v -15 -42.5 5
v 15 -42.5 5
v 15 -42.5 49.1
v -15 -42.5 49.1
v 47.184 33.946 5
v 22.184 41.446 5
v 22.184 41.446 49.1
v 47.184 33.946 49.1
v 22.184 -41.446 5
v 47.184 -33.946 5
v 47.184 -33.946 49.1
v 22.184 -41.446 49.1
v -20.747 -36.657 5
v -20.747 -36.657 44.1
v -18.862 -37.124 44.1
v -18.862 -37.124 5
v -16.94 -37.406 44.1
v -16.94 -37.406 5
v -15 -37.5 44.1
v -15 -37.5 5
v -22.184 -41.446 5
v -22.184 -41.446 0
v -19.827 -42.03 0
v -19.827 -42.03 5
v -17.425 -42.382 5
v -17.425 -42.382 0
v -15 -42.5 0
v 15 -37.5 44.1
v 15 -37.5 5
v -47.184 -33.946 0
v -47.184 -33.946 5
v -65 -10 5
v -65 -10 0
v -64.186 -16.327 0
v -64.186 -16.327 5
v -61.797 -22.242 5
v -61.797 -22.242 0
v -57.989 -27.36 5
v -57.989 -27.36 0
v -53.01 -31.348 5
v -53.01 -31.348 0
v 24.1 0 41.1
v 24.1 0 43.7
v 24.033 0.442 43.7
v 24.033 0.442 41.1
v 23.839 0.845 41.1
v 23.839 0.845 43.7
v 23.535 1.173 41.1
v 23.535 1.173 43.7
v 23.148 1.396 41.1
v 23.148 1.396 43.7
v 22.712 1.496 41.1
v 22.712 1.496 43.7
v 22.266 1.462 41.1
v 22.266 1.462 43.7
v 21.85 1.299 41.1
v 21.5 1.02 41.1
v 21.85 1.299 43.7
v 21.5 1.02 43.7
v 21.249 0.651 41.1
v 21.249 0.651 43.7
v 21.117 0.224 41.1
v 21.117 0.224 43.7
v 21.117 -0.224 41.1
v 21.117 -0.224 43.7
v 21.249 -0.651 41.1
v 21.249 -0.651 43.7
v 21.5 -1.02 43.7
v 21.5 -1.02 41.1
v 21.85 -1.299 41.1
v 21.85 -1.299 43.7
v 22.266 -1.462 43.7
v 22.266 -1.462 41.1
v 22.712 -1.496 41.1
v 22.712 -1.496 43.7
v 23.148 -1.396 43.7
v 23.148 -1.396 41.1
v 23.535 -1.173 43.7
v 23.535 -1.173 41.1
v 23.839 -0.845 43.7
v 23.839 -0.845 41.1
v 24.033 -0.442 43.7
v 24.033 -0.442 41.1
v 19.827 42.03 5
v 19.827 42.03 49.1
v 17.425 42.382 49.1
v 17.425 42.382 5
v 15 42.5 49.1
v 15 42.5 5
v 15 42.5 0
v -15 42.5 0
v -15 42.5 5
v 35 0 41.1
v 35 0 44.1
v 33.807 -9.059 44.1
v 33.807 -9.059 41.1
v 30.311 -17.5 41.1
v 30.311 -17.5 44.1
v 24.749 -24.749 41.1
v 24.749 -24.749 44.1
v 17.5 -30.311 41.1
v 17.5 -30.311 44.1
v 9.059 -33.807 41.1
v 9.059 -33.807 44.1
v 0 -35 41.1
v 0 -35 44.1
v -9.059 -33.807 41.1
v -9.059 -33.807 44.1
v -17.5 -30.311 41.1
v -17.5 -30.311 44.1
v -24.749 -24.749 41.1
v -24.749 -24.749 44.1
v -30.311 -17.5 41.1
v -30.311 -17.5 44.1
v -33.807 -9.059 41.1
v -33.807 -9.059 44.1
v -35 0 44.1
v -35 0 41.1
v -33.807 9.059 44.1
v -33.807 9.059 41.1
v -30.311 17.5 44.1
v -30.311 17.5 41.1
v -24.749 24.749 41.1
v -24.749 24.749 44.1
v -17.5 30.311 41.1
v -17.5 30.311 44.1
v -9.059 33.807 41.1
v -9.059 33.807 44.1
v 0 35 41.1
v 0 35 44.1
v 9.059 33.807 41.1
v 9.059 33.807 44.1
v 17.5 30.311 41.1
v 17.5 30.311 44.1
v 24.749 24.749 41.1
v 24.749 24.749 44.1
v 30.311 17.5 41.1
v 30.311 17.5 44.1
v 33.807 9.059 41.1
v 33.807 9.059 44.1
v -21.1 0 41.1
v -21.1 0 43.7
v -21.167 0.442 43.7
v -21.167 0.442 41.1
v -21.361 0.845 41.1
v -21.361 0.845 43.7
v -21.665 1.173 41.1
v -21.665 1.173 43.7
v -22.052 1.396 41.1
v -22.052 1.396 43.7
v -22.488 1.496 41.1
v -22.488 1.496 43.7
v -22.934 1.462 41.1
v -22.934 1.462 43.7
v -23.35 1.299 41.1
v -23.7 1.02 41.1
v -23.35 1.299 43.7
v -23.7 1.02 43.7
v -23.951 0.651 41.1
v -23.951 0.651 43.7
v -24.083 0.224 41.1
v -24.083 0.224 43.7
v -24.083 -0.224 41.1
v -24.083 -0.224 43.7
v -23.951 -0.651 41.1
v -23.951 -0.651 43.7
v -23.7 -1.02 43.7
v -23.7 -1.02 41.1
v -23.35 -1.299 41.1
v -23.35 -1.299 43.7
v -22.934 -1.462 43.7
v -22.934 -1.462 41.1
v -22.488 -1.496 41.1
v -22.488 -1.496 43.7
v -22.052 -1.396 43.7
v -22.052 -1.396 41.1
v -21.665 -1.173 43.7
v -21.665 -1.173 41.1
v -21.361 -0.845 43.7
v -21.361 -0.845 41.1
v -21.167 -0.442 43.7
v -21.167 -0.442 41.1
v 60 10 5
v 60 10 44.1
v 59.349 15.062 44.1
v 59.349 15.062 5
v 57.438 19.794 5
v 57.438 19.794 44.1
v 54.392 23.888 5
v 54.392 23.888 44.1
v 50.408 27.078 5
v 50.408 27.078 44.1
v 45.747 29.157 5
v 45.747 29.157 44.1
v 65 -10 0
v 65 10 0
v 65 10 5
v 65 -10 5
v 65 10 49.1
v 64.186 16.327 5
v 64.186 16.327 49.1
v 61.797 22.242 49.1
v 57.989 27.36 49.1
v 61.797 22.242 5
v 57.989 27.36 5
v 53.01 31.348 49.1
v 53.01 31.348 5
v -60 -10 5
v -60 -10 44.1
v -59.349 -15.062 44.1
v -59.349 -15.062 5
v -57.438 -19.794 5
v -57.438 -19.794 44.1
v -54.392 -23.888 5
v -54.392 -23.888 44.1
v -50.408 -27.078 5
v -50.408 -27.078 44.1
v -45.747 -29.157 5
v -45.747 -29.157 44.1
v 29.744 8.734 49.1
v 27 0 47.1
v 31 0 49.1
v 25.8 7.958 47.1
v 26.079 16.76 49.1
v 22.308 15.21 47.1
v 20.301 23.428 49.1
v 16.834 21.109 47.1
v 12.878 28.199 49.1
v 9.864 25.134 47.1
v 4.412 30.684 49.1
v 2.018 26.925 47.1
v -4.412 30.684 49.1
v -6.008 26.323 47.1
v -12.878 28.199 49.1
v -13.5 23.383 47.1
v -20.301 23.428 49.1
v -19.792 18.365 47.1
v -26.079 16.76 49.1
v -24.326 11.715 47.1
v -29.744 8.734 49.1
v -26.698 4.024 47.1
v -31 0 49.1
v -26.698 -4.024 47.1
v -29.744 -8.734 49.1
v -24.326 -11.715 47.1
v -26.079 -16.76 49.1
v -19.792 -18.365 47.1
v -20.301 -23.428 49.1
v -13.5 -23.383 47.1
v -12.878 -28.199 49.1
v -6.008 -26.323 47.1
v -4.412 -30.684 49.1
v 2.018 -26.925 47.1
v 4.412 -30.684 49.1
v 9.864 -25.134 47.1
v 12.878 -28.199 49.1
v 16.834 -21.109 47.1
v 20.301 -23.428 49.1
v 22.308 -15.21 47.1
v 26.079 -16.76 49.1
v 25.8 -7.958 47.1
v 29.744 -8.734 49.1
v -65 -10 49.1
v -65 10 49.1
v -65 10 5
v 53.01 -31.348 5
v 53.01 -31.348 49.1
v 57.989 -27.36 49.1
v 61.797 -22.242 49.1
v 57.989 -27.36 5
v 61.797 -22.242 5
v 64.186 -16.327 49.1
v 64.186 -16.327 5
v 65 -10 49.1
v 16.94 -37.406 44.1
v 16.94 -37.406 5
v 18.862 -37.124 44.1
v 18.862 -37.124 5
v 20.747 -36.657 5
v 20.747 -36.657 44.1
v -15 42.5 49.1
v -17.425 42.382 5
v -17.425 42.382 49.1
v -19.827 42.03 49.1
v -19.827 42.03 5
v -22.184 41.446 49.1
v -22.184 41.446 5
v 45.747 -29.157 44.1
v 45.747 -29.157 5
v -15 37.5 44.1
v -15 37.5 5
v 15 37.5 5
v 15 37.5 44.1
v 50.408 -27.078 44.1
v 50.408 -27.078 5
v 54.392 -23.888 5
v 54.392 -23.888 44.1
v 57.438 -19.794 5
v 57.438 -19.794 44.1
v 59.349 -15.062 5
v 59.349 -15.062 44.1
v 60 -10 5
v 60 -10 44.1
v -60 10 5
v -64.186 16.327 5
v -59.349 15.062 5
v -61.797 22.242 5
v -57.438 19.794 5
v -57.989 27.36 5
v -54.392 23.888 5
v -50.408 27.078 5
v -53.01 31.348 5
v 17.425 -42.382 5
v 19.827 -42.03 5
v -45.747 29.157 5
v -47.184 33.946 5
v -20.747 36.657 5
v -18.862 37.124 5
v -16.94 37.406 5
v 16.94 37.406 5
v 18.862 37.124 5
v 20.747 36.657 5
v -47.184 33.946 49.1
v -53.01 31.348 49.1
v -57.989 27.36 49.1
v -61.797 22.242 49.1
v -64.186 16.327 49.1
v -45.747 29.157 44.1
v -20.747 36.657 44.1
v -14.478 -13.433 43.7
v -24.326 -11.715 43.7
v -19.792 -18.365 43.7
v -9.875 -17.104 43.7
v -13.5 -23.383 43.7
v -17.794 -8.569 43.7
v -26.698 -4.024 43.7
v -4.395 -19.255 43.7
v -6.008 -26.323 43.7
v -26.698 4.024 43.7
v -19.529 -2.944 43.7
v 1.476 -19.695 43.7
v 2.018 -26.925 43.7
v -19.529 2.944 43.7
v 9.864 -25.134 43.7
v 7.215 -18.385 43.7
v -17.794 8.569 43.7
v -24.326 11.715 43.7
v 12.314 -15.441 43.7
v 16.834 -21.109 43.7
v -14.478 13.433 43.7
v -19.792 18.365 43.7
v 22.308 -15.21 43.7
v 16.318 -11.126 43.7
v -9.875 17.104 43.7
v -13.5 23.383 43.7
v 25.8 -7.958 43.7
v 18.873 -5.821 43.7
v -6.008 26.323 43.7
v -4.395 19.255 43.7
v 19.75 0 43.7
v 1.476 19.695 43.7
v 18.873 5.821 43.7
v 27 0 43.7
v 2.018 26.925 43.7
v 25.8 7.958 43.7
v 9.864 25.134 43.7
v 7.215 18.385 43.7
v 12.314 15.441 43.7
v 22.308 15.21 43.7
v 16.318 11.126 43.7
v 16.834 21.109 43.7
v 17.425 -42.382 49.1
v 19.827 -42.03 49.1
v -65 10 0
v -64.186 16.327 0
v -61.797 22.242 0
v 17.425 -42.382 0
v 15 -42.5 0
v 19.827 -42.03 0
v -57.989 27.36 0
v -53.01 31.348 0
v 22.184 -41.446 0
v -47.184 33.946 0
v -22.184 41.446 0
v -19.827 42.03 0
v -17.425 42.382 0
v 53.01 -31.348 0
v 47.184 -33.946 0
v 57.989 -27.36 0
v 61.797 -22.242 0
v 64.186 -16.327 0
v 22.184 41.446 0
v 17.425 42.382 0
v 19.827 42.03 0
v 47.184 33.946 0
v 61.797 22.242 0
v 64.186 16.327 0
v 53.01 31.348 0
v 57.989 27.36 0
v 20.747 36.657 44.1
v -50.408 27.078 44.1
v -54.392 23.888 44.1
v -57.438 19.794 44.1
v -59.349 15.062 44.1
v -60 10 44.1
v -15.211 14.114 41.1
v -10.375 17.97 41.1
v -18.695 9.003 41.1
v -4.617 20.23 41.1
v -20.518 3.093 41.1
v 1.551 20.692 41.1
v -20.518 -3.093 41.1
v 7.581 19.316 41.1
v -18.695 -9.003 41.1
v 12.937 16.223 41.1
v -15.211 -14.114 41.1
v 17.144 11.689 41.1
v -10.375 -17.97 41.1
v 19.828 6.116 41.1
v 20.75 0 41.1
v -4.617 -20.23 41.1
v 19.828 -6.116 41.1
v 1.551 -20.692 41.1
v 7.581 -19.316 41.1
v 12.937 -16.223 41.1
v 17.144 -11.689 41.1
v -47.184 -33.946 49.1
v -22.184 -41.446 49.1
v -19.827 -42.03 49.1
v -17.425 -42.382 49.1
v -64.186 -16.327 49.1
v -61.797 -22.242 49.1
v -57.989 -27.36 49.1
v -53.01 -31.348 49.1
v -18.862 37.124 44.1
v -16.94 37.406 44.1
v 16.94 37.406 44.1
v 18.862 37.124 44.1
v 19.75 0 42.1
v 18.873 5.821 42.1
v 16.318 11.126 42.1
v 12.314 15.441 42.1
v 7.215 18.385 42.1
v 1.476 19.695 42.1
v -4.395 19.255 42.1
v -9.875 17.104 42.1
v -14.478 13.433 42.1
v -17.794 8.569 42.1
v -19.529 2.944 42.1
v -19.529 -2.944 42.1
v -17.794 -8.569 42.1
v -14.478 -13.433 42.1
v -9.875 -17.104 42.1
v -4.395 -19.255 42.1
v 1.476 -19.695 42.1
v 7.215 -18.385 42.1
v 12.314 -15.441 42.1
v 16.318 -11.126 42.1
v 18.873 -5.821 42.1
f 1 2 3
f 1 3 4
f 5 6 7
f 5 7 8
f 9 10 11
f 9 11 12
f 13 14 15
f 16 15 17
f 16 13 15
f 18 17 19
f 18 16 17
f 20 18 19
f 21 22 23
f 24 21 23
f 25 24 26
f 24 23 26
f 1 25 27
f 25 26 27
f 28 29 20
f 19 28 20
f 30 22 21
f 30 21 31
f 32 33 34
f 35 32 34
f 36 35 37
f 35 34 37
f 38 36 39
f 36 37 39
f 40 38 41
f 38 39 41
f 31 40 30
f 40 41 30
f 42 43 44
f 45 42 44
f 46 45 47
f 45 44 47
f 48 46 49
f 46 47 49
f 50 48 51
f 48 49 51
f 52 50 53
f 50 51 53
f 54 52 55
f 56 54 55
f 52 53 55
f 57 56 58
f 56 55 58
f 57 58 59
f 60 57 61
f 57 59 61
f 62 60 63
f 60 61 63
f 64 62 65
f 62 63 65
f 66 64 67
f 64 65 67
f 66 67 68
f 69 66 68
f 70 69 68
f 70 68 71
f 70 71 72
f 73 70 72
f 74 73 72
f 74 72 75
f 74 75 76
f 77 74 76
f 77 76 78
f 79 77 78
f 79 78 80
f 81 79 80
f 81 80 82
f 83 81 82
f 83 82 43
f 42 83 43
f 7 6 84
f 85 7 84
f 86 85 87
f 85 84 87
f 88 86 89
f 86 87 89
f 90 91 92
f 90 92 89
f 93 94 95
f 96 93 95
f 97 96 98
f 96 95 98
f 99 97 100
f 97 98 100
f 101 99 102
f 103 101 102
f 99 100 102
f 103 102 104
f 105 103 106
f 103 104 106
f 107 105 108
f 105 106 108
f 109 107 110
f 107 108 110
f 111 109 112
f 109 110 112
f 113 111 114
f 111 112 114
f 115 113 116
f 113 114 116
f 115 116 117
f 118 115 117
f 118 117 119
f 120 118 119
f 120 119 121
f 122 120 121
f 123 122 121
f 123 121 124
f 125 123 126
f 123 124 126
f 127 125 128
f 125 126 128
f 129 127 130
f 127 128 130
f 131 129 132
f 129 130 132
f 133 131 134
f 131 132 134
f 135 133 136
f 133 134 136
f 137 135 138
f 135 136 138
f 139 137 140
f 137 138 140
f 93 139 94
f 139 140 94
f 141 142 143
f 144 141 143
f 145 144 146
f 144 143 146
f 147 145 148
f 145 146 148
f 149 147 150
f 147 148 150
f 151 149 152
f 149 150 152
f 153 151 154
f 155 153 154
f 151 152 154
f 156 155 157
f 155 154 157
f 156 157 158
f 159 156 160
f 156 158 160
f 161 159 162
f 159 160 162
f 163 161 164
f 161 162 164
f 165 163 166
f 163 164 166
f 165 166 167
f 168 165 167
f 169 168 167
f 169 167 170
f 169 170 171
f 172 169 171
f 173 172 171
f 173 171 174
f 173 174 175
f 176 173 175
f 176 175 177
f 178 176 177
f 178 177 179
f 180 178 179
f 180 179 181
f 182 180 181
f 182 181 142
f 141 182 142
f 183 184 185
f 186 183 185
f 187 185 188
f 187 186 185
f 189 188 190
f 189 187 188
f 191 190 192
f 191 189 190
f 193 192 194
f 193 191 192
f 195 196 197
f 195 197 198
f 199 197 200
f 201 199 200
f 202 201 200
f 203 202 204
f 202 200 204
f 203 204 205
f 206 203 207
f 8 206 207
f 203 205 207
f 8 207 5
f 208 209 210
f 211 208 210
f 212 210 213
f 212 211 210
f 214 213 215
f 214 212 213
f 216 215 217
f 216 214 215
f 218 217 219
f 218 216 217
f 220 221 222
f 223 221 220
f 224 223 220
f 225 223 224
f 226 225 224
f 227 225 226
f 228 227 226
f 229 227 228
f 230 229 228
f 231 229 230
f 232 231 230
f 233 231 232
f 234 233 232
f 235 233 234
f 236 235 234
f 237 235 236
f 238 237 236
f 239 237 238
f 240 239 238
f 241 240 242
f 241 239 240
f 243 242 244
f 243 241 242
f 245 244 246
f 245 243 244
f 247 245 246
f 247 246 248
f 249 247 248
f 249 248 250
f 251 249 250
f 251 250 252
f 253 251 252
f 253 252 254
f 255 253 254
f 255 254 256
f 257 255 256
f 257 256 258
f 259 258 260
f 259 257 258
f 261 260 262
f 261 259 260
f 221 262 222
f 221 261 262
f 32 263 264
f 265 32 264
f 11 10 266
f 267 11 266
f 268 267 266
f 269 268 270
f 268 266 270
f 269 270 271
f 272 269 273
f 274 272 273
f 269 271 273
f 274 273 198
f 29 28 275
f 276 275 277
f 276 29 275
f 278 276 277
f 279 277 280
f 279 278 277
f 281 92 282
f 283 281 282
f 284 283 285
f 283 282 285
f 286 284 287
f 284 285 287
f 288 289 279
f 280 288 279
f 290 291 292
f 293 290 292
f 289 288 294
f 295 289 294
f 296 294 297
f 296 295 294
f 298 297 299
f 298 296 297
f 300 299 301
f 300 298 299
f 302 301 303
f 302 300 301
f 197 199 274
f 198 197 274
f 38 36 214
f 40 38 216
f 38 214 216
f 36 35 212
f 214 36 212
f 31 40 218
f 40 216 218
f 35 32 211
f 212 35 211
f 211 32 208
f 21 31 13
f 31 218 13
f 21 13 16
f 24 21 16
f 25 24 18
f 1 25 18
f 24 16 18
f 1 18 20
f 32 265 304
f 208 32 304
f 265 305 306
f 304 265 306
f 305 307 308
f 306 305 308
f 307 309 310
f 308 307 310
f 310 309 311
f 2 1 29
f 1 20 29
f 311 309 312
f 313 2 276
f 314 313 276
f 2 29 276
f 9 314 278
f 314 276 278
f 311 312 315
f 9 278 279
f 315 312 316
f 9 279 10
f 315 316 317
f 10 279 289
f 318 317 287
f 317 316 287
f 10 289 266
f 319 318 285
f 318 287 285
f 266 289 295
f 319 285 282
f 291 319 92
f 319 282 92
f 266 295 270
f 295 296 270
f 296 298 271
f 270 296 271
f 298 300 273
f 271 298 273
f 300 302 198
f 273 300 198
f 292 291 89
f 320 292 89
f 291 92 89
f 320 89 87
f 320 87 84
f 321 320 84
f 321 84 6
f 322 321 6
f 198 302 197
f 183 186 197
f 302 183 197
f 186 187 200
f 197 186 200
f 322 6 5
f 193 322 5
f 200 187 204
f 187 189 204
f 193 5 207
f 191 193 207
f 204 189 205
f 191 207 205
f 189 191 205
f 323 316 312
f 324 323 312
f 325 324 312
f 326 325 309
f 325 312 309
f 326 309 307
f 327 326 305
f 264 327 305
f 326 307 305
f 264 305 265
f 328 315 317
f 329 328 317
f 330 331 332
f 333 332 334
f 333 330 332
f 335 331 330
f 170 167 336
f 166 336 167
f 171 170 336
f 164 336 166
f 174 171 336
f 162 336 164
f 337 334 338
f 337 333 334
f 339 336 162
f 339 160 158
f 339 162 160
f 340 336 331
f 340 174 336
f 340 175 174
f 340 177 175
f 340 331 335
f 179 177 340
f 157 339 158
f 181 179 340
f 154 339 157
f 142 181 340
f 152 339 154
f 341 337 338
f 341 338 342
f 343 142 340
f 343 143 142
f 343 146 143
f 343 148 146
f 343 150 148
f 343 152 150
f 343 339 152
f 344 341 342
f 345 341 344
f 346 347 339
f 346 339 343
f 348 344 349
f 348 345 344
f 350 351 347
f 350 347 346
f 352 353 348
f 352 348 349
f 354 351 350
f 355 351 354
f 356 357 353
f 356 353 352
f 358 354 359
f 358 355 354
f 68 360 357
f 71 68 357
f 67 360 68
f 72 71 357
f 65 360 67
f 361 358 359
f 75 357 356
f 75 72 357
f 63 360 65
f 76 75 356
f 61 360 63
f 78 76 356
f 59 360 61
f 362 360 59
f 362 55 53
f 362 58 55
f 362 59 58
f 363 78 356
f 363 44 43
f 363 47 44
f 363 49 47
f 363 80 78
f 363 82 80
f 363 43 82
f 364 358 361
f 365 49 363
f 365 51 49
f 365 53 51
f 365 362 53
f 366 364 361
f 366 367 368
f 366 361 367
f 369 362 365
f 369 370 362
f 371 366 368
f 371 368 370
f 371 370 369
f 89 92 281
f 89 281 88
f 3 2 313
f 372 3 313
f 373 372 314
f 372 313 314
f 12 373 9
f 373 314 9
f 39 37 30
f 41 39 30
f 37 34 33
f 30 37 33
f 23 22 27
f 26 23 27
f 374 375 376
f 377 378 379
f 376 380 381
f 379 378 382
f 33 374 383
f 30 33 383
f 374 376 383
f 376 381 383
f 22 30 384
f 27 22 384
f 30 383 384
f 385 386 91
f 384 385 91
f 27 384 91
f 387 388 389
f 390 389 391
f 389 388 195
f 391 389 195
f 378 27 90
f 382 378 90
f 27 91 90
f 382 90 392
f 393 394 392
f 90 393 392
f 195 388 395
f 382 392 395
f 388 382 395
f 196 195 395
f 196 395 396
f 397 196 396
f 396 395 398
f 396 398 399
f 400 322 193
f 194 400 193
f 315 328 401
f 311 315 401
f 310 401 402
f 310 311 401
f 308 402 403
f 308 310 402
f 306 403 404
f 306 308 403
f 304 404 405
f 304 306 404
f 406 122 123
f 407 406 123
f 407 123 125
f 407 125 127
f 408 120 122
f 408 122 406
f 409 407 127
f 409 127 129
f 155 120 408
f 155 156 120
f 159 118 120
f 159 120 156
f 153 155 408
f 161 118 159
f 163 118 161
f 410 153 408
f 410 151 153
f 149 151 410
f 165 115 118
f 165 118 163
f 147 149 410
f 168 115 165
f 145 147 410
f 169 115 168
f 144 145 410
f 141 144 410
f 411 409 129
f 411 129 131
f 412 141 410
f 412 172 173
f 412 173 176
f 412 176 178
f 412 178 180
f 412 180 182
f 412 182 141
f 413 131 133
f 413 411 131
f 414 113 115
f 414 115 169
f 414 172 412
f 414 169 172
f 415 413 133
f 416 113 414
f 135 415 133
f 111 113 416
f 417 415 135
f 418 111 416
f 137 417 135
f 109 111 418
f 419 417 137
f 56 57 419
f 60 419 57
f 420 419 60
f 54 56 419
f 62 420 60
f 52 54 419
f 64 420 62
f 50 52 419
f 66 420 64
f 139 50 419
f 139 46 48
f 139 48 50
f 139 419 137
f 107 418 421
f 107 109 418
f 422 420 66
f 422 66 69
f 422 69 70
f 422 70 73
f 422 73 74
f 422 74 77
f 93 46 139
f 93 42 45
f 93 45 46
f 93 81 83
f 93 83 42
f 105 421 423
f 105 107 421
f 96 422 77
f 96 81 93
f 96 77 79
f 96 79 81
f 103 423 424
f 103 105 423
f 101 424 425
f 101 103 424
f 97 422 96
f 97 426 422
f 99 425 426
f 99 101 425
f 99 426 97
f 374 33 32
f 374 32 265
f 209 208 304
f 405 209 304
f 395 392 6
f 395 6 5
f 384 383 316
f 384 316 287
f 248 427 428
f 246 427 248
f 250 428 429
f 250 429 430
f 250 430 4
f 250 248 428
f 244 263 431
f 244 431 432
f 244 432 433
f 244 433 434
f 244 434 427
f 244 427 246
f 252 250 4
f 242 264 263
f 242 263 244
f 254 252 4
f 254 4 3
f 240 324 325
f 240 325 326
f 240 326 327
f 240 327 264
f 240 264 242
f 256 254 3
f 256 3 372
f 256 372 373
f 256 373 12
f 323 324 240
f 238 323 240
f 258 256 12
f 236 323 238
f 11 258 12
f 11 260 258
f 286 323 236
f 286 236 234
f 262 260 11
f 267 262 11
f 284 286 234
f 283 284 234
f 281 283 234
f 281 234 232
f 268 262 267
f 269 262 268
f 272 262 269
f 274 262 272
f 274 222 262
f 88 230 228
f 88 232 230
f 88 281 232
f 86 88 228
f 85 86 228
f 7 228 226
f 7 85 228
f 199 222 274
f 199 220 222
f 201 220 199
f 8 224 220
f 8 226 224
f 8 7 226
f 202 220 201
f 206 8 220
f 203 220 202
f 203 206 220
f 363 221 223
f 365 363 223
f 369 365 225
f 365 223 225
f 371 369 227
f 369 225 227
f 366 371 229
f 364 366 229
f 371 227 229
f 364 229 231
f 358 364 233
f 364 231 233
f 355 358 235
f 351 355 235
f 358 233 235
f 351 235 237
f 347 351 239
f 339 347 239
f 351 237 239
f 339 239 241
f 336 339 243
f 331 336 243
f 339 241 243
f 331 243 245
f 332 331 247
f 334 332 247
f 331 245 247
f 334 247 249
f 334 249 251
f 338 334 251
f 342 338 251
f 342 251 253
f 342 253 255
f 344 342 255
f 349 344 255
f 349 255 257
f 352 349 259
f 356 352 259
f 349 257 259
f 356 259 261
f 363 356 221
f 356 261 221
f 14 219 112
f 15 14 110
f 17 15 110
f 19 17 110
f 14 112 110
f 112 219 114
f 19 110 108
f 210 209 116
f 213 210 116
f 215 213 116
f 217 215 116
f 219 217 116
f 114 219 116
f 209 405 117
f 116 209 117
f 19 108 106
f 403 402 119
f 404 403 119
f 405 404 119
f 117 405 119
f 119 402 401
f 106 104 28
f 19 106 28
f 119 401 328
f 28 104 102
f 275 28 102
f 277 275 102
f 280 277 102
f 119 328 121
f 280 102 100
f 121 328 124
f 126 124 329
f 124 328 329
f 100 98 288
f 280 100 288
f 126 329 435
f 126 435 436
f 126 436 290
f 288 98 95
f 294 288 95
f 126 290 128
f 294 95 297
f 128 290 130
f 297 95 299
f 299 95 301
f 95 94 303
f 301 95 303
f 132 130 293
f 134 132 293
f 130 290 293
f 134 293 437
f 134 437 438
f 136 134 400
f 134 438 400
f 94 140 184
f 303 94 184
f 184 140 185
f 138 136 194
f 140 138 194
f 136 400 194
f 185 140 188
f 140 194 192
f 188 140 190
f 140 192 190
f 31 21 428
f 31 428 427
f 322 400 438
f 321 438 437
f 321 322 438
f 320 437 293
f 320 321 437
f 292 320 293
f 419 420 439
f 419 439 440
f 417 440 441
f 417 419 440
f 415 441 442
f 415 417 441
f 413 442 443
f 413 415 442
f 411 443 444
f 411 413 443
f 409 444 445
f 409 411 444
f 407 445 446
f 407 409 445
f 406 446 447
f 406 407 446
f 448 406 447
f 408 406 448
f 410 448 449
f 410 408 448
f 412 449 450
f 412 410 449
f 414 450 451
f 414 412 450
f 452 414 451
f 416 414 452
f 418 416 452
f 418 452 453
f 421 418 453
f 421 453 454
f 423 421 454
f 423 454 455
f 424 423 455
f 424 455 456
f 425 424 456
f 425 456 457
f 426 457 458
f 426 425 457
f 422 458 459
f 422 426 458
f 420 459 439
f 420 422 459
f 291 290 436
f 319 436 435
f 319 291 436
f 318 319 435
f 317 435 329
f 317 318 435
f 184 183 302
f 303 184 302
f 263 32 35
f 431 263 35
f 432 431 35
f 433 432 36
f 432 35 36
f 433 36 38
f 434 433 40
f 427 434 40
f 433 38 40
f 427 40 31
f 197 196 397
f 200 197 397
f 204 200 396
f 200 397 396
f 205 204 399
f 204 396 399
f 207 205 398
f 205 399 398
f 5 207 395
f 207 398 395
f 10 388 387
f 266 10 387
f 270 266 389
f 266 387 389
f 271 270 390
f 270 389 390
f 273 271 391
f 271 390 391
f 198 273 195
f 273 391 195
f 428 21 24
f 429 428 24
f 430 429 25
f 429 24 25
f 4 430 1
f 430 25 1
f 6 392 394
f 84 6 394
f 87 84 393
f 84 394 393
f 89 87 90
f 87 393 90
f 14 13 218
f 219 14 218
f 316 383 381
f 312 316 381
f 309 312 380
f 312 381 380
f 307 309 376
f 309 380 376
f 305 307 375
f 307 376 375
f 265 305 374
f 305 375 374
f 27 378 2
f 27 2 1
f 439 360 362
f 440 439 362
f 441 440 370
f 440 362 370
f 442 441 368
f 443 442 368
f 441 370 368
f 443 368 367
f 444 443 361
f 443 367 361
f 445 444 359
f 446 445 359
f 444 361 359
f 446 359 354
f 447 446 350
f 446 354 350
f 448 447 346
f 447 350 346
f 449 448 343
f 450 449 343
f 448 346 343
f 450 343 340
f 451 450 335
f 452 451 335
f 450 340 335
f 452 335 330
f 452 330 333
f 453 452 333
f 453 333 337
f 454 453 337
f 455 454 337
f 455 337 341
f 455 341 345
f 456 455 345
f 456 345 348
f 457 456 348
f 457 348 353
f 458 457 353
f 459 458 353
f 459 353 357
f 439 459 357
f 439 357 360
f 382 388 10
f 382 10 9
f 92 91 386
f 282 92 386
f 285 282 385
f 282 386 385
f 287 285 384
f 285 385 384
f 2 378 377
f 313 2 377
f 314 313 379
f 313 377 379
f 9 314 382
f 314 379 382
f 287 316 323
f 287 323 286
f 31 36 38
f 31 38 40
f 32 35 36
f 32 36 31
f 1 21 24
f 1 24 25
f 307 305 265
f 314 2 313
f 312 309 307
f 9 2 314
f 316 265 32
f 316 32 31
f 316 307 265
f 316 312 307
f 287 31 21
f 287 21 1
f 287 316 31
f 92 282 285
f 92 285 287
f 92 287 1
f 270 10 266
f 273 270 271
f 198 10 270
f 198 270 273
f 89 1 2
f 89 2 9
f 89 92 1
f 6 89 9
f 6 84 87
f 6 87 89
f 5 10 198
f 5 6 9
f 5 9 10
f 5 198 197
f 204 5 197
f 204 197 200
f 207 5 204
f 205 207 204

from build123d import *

# Parameters (mm, degrees)
PAD002_DEPTH    = 5
SKETCH019_R     = 35
PAD003_DEPTH    = 3
PAD001_DEPTH    = 39.1
SKETCH018_R     = 27
POCKET_DEPTH    = 5.4
SKETCH020_R     = 19.75
SKETCH020_R_2   = 1.5
POCKET001_DEPTH = 10
CHAMFER_SIZE2   = 2
CHAMFER_SIZE    = 4
CHAMFER001_SIZE = 1
PAD_DEPTH       = 5


with BuildPart() as body:
    # Sketch017 (on Sketch) → Pad002 (new body)
    with BuildSketch(Plane.XY.offset(44.1)):
        with BuildLine():
            ThreePointArc((-47.183697, 33.945657), (-60.057323, 24.923263), (-65, 10))
            Line((-65, -10), (-65, 10))
            ThreePointArc((-65, -10), (-60.057323, -24.923263), (-47.183697, -33.945657))
            Line((-22.183697, -41.445657), (-47.183697, -33.945657))
            ThreePointArc((-22.183697, -41.445657), (-18.630329, -42.23501), (-15, -42.5))
            Line((15, -42.5), (-15, -42.5))
            ThreePointArc((15, -42.5), (18.630329, -42.23501), (22.183697, -41.445657))
            Line((47.183697, -33.945657), (22.183697, -41.445657))
            ThreePointArc((47.183697, -33.945657), (60.057323, -24.923263), (65, -10))
            Line((65, 10), (65, -10))
            ThreePointArc((65, 10), (60.057323, 24.923263), (47.183697, 33.945657))
            Line((22.183697, 41.445657), (47.183697, 33.945657))
            ThreePointArc((22.183697, 41.445657), (18.630329, 42.23501), (15, 42.5))
            Line((-15, 42.5), (15, 42.5))
            ThreePointArc((-15, 42.5), (-18.630329, 42.23501), (-22.183697, 41.445657))
            Line((-47.183697, 33.945657), (-22.183697, 41.445657))
        make_face()
    extrude(amount=PAD002_DEPTH)

    # Sketch019 (on Face17 of Pad002) → Pad003 (join)
    with BuildSketch(Plane(origin=(0, 0, 44.1), x_dir=(1, 0, 0), z_dir=(0, 0, -1))):
        Circle(SKETCH019_R)
    extrude(amount=PAD003_DEPTH)

    # Sketch015 (on Sketch) → Pad001 (join)
    with BuildSketch(Plane.XY.offset(5)):
        with BuildLine():
            ThreePointArc((-47.183697, 33.945657), (-60.057323, 24.923263), (-65, 10))
            Line((-65, -10), (-65, 10))
            ThreePointArc((-65, -10), (-60.057323, -24.923263), (-47.183697, -33.945657))
            Line((-22.183697, -41.445657), (-47.183697, -33.945657))
            ThreePointArc((-22.183697, -41.445657), (-18.630329, -42.23501), (-15, -42.5))
            Line((15, -42.5), (-15, -42.5))
            ThreePointArc((15, -42.5), (18.630329, -42.23501), (22.183697, -41.445657))
            Line((47.183697, -33.945657), (22.183697, -41.445657))
            ThreePointArc((47.183697, -33.945657), (60.057323, -24.923263), (65, -10))
            Line((65, 10), (65, -10))
            ThreePointArc((65, 10), (60.057323, 24.923263), (47.183697, 33.945657))
            Line((22.183697, 41.445657), (47.183697, 33.945657))
            ThreePointArc((22.183697, 41.445657), (18.630329, 42.23501), (15, 42.5))
            Line((-15, 42.5), (15, 42.5))
            ThreePointArc((-15, 42.5), (-18.630329, 42.23501), (-22.183697, 41.445657))
            Line((-47.183697, 33.945657), (-22.183697, 41.445657))
        make_face()
        with BuildLine():
            Line((-45.746958, 29.156526), (-20.746958, 36.656526))
            ThreePointArc((-15, 37.5), (-17.904263, 37.288008), (-20.746958, 36.656526))
            Line((-15, 37.5), (15, 37.5))
            ThreePointArc((20.746958, 36.656526), (17.904263, 37.288008), (15, 37.5))
            Line((20.746958, 36.656526), (45.746958, 29.156526))
            ThreePointArc((60, 10), (56.045859, 21.938611), (45.746958, 29.156526))
            Line((60, 10), (60, -10))
            ThreePointArc((45.746958, -29.156526), (56.045859, -21.938611), (60, -10))
            Line((45.746958, -29.156526), (20.746958, -36.656526))
            ThreePointArc((15, -37.5), (17.904263, -37.288008), (20.746958, -36.656526))
            Line((15, -37.5), (-15, -37.5))
            ThreePointArc((-20.746958, -36.656526), (-17.904263, -37.288008), (-15, -37.5))
            Line((-20.746958, -36.656526), (-45.746958, -29.156526))
            ThreePointArc((-60, -10), (-56.045859, -21.938611), (-45.746958, -29.156526))
            Line((-60, -10), (-60, 10))
            ThreePointArc((-45.746958, 29.156526), (-56.045859, 21.938611), (-60, 10))
        make_face(mode=Mode.SUBTRACT)
    extrude(amount=PAD001_DEPTH)

    # Sketch018 (on Face18 of Pad002) → Pocket (cut)
    with BuildSketch(Plane.XY.offset(49.1)):
        Circle(SKETCH018_R)
    extrude(amount=-POCKET_DEPTH, mode=Mode.SUBTRACT)

    # Sketch020 (on Face52 of Pocket) → Pocket001 (cut)
    with BuildSketch(Plane.XY.offset(43.7)):
        Circle(SKETCH020_R)
        with Locations((-22.6, 0)):
            Circle(SKETCH020_R_2)
        with Locations((22.6, 0)):
            Circle(SKETCH020_R_2)
    extrude(amount=-POCKET001_DEPTH, mode=Mode.SUBTRACT)

    # Chamfer
    chamfer_edges = [body.edges().sort_by_distance(p)[0] for p in [
        (-27, 0, 49.1),
    ]]
    chamfer_side = body.faces().sort_by_distance((-58.811184, 23.996097, 49.1))[0]
    chamfer(chamfer_edges, length=CHAMFER_SIZE, length2=CHAMFER_SIZE2, reference=chamfer_side)

    # Chamfer001
    chamfer001_edges = [body.edges().sort_by_distance(p)[0] for p in [
        (-19.75, 0, 41.1),
    ]]
    chamfer(chamfer001_edges, length=CHAMFER001_SIZE)


with BuildPart() as baseplate:
    # Sketch023 (on Sketch) → Pad (new body)
    with BuildSketch(Plane.XY):
        with BuildLine():
            ThreePointArc((-47.183697, 33.945657), (-60.057323, 24.923263), (-65, 10))
            Line((-65, -10), (-65, 10))
            ThreePointArc((-65, -10), (-60.057323, -24.923263), (-47.183697, -33.945657))
            Line((-22.183697, -41.445657), (-47.183697, -33.945657))
            ThreePointArc((-22.183697, -41.445657), (-18.630329, -42.23501), (-15, -42.5))
            Line((15, -42.5), (-15, -42.5))
            ThreePointArc((15, -42.5), (18.630329, -42.23501), (22.183697, -41.445657))
            Line((47.183697, -33.945657), (22.183697, -41.445657))
            ThreePointArc((47.183697, -33.945657), (60.057323, -24.923263), (65, -10))
            Line((65, 10), (65, -10))
            ThreePointArc((65, 10), (60.057323, 24.923263), (47.183697, 33.945657))
            Line((22.183697, 41.445657), (47.183697, 33.945657))
            ThreePointArc((22.183697, 41.445657), (18.630329, 42.23501), (15, 42.5))
            Line((-15, 42.5), (15, 42.5))
            ThreePointArc((-15, 42.5), (-18.630329, 42.23501), (-22.183697, 41.445657))
            Line((-47.183697, 33.945657), (-22.183697, 41.445657))
        make_face()
    extrude(amount=PAD_DEPTH)


solid = Compound([body.part, baseplate.part])
